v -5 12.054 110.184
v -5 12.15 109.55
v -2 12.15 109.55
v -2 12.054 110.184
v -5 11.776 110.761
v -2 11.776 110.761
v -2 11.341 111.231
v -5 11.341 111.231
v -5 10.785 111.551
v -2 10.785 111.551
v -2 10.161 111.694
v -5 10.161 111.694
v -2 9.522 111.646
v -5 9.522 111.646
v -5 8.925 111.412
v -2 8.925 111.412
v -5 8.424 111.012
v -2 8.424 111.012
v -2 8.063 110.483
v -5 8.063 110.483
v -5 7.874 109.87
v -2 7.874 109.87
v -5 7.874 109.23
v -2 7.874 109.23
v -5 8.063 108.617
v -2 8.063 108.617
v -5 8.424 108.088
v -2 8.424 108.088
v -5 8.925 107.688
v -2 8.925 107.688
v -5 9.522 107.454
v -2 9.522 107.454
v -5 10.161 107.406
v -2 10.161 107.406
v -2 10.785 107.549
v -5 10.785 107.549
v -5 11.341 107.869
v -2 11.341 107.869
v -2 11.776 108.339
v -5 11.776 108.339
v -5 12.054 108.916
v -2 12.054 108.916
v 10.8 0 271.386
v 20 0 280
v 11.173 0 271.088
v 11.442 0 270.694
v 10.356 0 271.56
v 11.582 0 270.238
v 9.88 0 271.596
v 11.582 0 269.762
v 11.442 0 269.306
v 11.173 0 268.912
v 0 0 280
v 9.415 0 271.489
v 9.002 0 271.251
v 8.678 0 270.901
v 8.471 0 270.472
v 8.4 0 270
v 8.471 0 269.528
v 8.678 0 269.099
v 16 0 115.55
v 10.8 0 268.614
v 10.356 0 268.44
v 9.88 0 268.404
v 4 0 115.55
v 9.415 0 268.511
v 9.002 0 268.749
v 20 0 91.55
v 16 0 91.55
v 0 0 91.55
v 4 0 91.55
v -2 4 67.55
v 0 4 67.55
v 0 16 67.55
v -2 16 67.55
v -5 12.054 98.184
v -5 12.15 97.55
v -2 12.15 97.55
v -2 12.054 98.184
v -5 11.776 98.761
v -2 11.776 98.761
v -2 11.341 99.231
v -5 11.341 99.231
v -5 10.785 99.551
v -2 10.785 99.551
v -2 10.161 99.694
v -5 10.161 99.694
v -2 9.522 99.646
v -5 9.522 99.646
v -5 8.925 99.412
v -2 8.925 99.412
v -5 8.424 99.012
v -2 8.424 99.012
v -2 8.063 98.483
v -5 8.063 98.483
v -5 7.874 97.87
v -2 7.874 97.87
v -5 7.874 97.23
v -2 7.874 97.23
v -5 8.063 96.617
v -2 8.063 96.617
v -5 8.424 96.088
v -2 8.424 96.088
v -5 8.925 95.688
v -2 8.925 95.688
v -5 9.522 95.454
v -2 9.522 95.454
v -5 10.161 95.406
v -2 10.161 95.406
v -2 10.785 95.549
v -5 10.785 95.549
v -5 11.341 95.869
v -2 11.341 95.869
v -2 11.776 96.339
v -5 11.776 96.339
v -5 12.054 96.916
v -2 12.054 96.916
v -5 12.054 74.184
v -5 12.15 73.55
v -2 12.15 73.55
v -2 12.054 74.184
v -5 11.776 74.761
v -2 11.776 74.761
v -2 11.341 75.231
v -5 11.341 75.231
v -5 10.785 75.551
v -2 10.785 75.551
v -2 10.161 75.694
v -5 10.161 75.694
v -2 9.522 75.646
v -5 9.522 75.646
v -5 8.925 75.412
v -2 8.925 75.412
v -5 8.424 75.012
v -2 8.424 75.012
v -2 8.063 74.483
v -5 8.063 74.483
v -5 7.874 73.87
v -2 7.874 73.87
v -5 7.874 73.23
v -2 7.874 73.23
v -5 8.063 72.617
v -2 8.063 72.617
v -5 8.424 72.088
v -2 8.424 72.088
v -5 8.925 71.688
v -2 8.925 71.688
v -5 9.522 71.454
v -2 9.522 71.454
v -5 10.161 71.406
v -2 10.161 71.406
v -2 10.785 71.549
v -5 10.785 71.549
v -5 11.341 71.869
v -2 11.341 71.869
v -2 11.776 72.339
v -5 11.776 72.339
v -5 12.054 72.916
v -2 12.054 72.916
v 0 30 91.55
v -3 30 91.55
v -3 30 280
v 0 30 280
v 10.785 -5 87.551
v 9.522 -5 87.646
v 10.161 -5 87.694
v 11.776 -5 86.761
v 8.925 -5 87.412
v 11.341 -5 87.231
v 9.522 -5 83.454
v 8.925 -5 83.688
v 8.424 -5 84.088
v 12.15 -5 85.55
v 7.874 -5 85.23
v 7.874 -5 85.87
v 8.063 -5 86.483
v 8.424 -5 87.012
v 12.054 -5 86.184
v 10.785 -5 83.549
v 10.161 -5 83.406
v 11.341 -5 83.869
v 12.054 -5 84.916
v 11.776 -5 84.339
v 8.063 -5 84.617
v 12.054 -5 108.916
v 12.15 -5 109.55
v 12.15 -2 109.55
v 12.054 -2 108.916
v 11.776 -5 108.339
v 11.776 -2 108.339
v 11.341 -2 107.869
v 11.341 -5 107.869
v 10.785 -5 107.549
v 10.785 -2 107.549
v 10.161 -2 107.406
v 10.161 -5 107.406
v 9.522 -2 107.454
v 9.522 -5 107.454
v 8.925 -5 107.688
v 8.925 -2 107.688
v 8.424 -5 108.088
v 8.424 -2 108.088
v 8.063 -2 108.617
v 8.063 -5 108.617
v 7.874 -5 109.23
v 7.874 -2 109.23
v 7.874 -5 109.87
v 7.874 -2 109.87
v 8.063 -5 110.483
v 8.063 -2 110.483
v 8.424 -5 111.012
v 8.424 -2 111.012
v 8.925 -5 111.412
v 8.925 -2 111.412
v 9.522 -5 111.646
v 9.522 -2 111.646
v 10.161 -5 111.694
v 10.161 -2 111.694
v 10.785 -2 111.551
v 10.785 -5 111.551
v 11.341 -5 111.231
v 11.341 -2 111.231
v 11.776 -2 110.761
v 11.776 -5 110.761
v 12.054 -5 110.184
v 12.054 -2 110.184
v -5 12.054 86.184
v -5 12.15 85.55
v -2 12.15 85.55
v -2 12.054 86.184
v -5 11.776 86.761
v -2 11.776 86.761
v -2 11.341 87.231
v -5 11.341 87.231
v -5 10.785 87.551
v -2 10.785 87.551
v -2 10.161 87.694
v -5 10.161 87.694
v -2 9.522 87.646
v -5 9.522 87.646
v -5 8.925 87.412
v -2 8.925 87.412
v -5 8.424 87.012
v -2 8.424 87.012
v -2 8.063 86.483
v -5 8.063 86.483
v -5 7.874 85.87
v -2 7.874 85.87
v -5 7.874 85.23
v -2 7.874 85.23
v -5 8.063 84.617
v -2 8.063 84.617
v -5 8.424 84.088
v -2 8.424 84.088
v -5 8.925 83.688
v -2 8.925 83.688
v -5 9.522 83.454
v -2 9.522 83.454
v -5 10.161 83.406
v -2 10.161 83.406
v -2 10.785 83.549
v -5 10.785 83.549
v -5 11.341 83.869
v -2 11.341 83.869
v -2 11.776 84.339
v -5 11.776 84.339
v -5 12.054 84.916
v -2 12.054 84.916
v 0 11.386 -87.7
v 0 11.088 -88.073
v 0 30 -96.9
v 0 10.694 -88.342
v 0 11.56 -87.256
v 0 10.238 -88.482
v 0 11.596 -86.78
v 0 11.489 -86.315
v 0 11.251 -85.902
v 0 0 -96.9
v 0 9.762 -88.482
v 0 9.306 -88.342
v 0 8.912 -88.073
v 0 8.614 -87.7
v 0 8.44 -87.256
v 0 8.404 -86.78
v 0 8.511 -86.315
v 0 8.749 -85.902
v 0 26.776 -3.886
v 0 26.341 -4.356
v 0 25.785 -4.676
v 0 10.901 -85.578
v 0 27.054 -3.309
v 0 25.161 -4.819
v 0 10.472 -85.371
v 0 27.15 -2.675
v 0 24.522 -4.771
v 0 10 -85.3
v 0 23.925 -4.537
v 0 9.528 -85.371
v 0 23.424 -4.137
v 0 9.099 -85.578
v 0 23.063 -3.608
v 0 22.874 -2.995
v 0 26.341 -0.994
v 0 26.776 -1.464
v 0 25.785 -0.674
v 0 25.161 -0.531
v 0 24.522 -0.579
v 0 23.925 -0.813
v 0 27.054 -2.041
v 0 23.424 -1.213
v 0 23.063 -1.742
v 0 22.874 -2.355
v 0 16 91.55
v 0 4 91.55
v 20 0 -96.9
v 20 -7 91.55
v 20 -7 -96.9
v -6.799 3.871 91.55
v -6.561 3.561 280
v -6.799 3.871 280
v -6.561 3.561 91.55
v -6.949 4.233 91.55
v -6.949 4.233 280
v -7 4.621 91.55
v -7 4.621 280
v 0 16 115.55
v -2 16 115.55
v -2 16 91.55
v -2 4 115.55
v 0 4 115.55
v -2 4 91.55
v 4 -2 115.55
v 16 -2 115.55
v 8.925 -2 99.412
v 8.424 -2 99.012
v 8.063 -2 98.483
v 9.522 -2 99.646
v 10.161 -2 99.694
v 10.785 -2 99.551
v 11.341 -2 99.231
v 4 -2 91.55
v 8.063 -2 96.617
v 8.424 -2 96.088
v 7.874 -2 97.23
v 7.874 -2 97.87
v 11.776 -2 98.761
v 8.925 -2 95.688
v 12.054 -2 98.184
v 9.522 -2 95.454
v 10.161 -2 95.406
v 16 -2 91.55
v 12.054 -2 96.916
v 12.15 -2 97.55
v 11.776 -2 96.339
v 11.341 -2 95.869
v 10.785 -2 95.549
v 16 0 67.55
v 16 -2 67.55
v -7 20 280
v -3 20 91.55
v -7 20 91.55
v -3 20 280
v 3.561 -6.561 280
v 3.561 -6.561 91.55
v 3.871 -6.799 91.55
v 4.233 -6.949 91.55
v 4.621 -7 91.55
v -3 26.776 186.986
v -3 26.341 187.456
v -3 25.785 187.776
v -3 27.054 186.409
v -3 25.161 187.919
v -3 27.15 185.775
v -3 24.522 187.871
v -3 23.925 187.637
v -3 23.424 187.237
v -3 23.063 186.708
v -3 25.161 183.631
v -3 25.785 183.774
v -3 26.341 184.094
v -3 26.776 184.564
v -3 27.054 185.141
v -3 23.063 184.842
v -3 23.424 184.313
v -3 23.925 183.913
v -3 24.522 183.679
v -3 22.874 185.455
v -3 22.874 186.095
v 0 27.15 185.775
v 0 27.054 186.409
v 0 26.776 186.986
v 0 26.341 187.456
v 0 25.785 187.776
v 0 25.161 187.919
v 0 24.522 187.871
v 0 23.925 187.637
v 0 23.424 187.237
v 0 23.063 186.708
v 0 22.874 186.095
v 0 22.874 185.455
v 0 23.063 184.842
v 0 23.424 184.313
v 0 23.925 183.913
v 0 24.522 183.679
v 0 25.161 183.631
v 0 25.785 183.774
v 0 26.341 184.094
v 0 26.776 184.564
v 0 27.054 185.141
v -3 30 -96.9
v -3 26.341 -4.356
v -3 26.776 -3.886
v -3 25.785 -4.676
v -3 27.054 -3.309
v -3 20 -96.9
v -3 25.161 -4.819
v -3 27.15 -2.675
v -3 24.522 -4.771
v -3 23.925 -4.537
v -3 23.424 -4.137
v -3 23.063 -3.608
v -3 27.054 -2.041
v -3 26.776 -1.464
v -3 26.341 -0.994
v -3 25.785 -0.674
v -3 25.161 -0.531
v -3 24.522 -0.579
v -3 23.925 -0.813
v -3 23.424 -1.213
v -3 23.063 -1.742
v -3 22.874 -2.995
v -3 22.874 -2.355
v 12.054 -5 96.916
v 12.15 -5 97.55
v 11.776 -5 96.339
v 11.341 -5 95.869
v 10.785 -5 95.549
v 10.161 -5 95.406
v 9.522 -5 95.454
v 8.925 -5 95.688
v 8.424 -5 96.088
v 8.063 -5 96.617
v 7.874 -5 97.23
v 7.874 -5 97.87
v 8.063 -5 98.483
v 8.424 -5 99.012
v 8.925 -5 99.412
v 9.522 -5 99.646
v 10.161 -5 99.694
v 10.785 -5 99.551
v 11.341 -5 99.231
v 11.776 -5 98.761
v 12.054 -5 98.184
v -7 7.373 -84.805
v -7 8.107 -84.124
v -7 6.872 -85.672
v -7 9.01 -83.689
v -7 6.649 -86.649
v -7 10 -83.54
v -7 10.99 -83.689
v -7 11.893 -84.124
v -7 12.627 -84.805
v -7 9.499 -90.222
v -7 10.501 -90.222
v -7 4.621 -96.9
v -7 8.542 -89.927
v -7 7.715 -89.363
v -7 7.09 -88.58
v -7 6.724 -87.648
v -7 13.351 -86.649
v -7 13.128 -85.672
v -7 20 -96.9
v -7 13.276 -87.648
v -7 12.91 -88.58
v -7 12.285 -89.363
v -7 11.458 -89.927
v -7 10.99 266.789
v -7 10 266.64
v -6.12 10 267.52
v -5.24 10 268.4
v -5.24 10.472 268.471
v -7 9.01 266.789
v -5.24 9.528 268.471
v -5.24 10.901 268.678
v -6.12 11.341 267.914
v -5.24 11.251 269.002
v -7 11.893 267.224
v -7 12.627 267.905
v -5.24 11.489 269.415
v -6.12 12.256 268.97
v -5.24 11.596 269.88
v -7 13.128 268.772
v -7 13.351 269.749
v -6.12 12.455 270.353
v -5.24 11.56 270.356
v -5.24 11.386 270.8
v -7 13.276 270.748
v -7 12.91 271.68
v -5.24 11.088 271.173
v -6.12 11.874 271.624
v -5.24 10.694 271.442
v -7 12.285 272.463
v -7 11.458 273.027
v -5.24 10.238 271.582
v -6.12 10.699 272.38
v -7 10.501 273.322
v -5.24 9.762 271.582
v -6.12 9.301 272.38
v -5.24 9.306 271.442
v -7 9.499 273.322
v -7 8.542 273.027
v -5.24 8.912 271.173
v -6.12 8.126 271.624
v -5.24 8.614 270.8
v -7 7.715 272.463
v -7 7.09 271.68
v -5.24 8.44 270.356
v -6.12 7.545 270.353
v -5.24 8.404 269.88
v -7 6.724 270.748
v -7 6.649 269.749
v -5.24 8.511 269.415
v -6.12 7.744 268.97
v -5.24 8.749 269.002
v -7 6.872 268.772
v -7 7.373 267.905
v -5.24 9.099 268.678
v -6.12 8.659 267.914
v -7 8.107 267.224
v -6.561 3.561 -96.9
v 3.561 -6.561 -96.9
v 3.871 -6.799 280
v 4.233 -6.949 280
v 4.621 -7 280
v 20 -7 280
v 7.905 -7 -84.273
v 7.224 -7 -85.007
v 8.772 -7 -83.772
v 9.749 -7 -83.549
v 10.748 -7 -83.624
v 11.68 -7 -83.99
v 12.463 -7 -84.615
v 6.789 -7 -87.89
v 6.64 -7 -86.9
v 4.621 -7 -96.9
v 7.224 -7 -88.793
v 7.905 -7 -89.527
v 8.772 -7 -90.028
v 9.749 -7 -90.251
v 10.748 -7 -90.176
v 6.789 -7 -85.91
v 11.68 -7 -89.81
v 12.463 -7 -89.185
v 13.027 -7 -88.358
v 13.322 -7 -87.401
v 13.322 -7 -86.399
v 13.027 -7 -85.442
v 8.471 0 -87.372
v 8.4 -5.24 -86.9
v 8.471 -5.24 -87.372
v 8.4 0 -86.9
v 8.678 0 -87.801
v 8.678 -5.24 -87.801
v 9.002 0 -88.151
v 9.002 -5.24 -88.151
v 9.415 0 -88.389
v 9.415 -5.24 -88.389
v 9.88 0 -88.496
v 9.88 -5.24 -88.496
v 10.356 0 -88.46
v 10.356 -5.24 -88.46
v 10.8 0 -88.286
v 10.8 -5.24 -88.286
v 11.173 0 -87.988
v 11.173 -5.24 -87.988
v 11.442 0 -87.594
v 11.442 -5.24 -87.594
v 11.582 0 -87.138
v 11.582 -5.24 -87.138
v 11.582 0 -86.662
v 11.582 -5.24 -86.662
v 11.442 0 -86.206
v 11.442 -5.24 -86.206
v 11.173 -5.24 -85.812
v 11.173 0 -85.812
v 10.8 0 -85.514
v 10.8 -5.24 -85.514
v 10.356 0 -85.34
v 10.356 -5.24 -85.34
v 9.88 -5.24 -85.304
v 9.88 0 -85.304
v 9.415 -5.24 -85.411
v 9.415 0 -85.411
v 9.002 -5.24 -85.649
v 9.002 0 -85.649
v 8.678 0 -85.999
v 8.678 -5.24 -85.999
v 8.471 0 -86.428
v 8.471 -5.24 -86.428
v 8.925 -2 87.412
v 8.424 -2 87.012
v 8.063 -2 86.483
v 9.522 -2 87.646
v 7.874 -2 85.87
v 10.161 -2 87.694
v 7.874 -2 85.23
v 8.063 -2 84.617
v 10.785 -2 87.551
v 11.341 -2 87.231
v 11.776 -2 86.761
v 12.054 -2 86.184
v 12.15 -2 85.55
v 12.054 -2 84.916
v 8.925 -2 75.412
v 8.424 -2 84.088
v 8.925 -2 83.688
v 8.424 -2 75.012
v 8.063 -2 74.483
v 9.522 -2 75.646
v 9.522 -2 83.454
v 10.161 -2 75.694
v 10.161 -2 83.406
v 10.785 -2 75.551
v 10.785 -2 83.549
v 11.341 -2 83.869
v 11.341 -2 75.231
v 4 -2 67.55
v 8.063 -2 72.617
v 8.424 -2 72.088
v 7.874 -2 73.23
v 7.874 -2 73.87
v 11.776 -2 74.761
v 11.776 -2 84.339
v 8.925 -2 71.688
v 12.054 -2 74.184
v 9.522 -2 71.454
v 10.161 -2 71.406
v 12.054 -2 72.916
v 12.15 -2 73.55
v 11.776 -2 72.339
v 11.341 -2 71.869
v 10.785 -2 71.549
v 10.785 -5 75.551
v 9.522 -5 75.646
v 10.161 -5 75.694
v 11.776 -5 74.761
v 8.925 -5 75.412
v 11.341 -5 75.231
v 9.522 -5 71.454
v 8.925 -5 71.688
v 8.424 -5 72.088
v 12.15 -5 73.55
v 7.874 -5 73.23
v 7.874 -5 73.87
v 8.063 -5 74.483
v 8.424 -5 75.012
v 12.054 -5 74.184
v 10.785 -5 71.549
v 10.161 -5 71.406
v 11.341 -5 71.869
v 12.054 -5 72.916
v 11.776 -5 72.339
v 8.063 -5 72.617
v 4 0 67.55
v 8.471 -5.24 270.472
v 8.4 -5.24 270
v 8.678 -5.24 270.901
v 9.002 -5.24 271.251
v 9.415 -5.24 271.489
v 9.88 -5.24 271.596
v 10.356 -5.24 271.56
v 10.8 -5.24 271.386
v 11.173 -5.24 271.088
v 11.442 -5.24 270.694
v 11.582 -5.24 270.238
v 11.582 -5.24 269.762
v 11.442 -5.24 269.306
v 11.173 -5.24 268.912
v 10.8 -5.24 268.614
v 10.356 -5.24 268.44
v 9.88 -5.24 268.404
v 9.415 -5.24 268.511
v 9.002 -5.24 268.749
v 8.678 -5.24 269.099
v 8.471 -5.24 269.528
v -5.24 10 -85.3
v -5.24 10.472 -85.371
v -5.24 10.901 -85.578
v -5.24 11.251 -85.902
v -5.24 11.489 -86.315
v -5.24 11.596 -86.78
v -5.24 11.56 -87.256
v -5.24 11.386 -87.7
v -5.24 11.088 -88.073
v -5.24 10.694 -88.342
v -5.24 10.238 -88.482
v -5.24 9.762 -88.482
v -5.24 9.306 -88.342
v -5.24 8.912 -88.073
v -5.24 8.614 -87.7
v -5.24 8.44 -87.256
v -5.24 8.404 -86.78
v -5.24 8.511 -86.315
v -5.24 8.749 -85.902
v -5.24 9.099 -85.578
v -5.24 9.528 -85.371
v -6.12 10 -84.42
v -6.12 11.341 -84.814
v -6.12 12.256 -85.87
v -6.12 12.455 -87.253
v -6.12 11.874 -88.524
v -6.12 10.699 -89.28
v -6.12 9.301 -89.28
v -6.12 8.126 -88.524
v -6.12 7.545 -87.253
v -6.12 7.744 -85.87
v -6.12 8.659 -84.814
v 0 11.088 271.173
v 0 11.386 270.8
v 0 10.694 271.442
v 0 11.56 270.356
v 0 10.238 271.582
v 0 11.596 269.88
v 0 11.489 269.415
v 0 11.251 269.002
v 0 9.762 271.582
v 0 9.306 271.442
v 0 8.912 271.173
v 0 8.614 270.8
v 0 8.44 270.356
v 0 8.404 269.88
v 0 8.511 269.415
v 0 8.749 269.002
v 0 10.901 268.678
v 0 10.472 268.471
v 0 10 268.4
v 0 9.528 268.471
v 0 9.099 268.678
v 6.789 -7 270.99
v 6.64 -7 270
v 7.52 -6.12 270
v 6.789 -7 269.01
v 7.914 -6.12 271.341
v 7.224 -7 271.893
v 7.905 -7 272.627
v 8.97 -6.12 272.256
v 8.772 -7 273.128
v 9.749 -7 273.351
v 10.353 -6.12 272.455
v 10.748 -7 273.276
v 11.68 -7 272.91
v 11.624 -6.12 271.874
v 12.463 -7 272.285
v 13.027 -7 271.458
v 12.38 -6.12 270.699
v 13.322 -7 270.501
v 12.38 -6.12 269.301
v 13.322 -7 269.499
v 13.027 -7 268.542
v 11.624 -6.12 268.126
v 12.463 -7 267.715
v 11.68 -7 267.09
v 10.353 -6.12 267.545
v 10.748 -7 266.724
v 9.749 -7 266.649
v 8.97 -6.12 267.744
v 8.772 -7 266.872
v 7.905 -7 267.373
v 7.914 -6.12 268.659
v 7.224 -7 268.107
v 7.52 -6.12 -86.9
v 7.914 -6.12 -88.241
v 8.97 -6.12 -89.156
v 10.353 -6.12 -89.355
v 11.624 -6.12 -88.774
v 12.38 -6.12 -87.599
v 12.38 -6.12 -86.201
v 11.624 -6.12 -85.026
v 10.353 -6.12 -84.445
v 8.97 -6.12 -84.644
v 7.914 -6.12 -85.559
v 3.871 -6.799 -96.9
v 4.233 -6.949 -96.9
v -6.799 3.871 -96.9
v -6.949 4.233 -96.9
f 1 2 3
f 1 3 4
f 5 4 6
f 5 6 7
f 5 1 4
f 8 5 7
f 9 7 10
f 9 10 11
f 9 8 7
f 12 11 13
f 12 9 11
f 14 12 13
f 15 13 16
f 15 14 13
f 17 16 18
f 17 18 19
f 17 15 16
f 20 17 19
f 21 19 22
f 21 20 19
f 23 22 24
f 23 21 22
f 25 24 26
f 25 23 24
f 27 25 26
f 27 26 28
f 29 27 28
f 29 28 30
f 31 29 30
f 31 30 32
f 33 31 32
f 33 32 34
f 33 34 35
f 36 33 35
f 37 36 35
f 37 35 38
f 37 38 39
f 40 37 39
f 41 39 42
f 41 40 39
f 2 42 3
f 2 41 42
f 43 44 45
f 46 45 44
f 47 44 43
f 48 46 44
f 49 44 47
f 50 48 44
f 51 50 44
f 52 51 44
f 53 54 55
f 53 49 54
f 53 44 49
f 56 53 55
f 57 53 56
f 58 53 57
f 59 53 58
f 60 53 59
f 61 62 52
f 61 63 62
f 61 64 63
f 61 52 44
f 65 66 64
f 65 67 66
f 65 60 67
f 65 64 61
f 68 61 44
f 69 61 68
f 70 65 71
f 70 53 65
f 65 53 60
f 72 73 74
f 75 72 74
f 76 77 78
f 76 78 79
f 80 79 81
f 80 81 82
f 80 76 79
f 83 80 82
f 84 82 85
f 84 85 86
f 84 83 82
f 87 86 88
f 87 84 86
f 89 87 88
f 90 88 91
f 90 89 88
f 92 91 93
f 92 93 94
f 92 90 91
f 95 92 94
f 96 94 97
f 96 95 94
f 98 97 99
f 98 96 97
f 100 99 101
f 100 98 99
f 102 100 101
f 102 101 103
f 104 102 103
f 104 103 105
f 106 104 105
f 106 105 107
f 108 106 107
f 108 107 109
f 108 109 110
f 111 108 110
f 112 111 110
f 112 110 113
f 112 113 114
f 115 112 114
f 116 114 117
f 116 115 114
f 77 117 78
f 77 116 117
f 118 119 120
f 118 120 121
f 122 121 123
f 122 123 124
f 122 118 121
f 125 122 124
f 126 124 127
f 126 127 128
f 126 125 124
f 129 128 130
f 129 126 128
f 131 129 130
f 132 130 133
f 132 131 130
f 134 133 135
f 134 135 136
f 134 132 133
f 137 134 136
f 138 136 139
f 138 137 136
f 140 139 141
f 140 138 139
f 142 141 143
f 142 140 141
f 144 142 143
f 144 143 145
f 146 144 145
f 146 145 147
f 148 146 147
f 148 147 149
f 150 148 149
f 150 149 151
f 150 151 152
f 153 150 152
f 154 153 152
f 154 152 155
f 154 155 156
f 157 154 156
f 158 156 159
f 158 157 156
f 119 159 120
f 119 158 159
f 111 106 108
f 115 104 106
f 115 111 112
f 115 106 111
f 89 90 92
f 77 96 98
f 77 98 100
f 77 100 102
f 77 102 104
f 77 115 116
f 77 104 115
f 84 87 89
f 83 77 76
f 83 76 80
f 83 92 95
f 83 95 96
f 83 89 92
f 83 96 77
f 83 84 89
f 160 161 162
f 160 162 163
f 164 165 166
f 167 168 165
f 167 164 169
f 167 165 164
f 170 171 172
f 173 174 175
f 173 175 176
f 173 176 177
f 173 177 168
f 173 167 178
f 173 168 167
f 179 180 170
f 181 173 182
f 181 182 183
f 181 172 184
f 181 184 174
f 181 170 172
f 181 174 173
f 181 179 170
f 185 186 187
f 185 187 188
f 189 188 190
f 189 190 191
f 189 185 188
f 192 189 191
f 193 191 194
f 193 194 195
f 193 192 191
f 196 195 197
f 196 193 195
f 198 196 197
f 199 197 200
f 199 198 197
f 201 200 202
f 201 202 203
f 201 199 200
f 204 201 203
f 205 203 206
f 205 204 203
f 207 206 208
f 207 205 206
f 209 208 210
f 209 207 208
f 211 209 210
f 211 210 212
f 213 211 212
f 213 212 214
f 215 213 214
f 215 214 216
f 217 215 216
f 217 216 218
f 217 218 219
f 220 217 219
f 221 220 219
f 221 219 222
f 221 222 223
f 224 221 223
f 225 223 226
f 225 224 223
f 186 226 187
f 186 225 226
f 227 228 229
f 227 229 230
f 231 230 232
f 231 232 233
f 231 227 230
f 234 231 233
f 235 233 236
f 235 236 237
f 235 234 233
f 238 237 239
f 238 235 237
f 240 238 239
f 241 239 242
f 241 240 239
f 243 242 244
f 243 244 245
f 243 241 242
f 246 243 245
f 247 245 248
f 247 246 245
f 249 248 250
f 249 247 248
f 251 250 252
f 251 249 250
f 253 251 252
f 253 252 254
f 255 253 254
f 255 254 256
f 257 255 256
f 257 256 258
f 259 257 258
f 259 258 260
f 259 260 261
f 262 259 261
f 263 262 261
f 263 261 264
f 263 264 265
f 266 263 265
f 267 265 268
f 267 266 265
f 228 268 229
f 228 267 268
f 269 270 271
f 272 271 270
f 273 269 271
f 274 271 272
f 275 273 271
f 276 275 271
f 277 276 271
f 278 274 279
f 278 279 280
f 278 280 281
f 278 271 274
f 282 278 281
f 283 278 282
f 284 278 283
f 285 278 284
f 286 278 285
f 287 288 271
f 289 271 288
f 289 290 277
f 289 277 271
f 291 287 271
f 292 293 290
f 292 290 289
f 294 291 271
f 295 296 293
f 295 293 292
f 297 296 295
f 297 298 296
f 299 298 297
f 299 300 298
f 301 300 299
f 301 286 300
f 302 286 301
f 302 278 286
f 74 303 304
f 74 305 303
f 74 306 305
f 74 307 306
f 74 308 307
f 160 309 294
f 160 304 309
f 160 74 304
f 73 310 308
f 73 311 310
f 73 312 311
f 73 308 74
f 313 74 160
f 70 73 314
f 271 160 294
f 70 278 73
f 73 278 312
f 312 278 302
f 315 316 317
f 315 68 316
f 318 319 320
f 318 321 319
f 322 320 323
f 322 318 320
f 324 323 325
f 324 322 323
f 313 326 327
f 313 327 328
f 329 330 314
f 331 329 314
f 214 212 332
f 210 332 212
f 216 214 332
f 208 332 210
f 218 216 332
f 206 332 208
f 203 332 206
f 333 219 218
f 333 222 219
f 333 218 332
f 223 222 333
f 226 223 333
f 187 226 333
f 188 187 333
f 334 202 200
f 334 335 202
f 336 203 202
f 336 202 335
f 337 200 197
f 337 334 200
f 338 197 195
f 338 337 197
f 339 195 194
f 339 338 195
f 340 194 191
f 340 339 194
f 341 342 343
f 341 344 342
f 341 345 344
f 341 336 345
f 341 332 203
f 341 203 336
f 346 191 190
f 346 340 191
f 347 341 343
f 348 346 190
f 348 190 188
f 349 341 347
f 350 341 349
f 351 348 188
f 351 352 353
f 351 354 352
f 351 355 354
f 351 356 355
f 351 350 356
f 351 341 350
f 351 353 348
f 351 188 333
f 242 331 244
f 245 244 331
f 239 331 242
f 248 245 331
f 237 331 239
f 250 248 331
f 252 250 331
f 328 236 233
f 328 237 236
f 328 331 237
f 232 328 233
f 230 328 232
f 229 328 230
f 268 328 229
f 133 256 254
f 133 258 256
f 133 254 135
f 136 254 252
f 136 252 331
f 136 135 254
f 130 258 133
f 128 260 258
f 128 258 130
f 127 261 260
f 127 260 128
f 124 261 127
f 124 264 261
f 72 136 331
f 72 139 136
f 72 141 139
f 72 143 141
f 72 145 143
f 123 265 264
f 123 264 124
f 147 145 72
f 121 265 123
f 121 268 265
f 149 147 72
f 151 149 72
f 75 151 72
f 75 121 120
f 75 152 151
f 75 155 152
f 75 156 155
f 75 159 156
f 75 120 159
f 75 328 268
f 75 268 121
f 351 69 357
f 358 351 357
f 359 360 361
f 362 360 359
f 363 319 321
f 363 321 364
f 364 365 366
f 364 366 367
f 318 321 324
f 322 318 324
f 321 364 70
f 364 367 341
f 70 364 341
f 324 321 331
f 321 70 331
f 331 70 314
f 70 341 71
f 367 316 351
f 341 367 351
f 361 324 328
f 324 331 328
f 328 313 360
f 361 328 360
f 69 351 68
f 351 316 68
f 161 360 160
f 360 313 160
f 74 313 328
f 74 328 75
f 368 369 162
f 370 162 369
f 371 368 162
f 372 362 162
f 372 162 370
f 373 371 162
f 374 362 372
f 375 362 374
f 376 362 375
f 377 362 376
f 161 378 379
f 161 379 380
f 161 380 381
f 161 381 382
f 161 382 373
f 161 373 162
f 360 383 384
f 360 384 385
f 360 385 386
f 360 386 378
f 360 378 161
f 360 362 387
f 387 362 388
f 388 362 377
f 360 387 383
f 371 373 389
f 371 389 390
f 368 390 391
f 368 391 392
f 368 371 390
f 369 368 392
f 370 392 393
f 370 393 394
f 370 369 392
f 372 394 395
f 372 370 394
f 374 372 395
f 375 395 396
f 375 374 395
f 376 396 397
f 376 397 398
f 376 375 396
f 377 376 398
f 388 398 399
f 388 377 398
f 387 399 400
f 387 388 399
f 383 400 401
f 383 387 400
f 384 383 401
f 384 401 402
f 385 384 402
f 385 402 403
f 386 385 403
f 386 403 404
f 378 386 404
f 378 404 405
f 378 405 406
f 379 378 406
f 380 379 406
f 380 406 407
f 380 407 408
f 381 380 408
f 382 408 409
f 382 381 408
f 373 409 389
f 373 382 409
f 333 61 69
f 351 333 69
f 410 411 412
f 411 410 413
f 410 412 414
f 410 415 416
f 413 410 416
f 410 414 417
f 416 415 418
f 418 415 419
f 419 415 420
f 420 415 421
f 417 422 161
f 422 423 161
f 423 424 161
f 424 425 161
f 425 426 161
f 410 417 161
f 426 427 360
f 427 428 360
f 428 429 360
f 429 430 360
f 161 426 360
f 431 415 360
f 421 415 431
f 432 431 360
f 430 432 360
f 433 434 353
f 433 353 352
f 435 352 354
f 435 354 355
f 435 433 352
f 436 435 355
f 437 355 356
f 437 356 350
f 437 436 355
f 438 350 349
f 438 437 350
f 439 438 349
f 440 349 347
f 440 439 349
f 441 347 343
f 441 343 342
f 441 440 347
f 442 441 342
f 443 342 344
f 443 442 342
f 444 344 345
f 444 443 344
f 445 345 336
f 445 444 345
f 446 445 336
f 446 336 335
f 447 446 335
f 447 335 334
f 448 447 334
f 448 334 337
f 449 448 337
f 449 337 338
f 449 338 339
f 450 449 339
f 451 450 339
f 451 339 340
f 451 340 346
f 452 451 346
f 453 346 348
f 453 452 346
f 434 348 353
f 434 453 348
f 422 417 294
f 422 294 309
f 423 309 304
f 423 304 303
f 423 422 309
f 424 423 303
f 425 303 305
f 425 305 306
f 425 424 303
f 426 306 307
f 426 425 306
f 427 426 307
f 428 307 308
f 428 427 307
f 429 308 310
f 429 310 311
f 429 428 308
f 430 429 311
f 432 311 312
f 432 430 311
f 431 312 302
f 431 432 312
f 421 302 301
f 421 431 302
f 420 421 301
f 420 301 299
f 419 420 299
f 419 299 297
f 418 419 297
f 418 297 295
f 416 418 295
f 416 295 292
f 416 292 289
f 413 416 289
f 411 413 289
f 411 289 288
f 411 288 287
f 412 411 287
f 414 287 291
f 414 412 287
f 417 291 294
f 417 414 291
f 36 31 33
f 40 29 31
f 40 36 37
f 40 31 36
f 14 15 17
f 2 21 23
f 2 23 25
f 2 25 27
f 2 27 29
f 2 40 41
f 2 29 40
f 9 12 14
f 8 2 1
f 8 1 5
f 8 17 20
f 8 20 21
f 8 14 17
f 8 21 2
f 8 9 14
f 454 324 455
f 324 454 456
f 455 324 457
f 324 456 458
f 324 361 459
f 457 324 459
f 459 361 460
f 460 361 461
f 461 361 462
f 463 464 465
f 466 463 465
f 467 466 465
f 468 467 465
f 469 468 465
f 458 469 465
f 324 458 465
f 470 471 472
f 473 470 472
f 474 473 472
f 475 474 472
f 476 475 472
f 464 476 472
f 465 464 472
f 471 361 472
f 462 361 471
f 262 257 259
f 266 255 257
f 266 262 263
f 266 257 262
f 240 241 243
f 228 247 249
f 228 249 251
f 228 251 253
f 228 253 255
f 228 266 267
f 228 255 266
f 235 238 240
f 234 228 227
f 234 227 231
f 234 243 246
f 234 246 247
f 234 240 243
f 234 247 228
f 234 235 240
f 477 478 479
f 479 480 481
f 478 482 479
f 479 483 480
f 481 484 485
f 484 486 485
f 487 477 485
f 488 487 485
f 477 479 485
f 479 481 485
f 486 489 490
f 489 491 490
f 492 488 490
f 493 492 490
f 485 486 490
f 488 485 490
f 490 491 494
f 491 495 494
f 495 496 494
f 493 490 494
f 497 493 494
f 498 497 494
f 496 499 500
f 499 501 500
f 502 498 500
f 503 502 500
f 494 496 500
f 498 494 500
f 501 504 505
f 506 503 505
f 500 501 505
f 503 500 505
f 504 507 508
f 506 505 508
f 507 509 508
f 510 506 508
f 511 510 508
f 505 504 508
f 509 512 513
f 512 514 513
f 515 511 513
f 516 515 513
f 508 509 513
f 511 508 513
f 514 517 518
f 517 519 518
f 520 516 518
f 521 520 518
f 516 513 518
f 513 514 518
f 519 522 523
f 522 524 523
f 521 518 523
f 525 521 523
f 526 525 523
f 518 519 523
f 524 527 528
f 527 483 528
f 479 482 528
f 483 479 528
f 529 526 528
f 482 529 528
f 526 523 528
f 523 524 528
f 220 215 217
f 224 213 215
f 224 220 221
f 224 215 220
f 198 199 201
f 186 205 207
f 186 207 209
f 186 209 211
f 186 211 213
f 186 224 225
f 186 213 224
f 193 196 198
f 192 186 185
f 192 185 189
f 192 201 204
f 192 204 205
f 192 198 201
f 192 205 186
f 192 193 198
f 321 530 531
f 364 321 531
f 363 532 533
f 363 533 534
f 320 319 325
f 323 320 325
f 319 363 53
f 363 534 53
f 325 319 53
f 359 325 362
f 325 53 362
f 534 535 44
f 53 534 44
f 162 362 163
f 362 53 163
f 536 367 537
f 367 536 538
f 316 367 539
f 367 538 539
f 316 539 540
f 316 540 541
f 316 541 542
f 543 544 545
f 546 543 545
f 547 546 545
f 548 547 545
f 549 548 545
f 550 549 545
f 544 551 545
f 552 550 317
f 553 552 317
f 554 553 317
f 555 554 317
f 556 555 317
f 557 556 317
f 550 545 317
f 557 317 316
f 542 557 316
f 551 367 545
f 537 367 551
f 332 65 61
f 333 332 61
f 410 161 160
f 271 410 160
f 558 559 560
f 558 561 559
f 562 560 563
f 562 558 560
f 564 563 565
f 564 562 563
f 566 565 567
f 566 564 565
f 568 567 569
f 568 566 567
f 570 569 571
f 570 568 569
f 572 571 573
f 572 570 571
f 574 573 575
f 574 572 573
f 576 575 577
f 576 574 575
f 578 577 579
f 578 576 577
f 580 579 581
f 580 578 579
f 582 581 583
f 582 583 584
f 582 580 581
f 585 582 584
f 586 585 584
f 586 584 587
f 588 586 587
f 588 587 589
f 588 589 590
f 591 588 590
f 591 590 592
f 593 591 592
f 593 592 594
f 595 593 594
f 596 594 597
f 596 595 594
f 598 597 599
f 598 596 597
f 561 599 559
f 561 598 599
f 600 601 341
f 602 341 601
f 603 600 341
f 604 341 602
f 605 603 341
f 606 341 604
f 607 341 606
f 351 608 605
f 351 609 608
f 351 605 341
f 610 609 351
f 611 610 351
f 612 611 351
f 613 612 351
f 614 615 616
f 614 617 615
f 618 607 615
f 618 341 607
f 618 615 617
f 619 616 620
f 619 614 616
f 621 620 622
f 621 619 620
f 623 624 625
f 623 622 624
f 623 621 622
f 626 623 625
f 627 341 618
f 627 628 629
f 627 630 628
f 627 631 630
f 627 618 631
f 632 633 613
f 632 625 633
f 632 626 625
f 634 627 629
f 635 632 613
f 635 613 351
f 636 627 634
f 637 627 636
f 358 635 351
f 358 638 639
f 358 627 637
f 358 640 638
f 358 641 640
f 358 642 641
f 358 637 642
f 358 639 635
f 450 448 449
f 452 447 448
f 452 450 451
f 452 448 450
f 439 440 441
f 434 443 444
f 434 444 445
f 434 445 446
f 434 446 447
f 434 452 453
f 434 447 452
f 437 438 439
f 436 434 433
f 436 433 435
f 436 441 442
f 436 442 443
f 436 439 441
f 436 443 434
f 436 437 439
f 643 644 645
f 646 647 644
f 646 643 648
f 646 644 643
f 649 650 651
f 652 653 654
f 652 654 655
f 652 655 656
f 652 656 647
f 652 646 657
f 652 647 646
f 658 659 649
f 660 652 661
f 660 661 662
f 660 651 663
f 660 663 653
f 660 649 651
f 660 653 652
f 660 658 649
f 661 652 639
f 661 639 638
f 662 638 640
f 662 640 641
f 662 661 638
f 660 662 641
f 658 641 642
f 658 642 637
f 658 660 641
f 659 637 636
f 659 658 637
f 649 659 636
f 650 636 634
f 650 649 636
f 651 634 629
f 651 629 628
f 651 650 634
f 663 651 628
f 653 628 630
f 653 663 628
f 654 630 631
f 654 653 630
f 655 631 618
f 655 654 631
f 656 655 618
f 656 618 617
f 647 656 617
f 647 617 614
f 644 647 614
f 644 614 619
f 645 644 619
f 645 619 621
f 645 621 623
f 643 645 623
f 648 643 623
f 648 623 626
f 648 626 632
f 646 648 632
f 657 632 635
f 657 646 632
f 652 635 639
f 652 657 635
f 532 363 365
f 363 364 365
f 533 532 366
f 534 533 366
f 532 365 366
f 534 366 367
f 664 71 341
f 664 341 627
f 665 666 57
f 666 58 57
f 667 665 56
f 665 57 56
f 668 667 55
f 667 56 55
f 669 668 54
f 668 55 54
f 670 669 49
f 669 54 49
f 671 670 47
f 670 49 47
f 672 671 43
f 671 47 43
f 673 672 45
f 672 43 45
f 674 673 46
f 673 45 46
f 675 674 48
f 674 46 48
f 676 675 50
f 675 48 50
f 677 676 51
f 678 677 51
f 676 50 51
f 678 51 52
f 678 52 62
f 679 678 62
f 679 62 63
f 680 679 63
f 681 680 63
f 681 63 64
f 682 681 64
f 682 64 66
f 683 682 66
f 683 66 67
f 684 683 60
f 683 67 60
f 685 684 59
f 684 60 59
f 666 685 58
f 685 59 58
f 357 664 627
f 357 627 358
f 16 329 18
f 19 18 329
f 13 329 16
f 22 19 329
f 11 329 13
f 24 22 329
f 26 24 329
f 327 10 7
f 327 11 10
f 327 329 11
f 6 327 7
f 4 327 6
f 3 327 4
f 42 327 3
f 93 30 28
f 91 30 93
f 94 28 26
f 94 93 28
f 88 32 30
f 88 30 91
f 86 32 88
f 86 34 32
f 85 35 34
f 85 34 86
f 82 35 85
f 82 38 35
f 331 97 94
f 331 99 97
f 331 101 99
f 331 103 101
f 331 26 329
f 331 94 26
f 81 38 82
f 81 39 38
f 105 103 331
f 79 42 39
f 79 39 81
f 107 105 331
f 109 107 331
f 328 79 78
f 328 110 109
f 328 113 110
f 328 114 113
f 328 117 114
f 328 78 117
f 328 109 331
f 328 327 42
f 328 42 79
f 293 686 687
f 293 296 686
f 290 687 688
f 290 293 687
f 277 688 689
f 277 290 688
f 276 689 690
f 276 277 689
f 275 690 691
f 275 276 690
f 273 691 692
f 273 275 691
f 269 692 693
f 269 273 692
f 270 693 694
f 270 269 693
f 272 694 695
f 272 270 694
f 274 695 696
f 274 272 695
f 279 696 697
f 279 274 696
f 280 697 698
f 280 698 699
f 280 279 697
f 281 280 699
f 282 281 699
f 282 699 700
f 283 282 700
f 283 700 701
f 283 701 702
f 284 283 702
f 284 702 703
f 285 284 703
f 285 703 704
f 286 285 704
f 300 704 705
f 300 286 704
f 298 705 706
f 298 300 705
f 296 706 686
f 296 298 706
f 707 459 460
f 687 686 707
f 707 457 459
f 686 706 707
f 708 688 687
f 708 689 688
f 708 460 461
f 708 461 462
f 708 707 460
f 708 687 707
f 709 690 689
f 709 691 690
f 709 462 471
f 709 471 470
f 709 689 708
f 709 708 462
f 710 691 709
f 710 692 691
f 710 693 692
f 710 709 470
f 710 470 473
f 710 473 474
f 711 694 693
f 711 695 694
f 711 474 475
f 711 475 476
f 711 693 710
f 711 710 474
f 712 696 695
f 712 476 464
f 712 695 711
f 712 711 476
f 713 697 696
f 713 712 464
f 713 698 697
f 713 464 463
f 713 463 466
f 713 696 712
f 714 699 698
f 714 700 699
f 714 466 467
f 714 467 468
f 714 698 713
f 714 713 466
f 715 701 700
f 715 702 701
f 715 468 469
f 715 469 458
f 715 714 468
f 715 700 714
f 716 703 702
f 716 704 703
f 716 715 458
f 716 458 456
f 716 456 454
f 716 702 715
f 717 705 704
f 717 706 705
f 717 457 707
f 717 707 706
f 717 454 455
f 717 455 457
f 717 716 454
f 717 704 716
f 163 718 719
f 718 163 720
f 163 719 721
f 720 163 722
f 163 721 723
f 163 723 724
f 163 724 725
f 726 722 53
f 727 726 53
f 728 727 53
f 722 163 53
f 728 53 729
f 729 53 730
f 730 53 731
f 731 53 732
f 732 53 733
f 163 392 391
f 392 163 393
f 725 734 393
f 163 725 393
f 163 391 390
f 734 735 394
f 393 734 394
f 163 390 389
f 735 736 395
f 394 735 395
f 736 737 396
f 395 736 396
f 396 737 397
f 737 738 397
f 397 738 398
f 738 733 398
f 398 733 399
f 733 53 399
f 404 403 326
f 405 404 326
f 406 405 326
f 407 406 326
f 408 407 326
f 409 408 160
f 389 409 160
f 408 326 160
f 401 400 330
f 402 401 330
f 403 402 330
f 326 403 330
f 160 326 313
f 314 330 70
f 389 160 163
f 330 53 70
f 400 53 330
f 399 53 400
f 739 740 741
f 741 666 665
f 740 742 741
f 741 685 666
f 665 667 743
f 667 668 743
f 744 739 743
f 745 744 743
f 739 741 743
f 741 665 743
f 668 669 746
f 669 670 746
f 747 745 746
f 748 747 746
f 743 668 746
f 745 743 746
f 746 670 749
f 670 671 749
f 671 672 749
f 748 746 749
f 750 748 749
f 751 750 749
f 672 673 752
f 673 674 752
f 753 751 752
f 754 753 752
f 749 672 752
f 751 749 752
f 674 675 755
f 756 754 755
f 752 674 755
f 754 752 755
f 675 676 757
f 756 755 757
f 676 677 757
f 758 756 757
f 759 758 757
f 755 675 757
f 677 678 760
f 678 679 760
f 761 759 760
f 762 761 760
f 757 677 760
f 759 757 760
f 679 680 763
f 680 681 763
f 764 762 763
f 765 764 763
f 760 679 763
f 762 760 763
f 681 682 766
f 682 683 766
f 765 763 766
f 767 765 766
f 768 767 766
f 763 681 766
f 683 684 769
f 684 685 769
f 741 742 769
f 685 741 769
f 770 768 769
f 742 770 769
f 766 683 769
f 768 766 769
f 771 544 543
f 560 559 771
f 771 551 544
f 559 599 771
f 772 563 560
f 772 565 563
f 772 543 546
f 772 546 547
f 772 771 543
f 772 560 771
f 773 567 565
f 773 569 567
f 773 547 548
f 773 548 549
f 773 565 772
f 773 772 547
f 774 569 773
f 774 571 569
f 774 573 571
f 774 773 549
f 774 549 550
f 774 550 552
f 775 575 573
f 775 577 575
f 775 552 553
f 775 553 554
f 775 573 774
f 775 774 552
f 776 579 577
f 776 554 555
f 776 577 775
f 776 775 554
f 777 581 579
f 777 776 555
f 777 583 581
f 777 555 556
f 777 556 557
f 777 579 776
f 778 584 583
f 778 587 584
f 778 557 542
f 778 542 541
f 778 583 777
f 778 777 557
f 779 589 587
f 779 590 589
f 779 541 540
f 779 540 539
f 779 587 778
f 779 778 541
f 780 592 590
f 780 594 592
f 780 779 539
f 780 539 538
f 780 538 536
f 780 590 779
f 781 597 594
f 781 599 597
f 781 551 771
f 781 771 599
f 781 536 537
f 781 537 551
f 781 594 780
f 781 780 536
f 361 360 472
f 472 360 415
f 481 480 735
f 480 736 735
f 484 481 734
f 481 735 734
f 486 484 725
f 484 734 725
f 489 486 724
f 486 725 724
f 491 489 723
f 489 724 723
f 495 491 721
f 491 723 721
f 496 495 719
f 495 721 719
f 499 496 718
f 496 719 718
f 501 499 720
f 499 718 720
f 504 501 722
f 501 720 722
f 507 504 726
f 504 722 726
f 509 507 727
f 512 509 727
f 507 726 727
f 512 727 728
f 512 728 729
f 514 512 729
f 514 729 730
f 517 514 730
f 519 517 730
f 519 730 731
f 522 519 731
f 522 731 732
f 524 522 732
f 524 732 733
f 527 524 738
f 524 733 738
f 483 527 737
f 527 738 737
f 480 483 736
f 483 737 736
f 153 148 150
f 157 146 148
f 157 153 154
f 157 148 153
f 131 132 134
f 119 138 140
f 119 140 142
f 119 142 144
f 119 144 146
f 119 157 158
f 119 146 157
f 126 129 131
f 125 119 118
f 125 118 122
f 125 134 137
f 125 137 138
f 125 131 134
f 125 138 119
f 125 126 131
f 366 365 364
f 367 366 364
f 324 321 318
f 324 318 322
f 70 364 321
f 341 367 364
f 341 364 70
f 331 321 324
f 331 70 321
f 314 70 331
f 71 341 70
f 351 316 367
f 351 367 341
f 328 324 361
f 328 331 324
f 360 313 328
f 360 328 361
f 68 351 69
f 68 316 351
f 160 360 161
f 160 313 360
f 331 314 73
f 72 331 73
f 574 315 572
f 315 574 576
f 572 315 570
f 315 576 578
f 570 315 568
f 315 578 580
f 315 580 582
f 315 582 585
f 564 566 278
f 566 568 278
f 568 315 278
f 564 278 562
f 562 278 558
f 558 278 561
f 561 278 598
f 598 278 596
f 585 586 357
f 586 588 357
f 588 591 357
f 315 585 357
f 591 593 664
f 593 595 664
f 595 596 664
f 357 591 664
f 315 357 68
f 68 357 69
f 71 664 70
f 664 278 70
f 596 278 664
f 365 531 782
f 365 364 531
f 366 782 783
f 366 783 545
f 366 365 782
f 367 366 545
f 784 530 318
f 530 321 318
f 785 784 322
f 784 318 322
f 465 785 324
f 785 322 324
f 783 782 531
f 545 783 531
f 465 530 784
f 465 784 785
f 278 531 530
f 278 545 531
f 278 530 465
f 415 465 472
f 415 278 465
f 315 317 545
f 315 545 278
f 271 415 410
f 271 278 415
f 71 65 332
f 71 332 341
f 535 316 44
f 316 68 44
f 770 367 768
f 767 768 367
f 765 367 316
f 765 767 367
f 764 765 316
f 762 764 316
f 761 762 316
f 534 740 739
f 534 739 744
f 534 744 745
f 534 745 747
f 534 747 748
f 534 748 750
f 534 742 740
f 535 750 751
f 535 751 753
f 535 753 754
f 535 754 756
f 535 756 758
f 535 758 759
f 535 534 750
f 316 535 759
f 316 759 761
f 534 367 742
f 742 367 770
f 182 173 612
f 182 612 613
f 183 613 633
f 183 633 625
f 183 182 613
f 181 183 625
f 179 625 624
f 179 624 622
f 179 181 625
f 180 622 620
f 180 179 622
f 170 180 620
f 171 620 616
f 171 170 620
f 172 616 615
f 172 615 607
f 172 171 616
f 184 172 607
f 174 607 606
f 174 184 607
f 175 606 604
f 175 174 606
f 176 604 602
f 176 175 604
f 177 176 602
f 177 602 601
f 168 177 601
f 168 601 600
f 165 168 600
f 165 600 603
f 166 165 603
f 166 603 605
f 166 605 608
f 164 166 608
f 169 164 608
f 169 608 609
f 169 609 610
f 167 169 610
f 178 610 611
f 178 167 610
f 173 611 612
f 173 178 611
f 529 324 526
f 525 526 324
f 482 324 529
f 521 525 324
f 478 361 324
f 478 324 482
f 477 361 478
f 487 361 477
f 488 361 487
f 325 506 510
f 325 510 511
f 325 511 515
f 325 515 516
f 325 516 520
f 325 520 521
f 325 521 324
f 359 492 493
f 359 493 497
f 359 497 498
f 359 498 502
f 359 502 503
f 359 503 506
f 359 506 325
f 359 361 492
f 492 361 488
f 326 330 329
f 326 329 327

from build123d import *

# Parameters (mm, degrees)
BOSS_EXTRUDE1_DEPTH                = 188.45
FILLET1_R                          = 1.5
SKETCH6_W                          = 188.45
SKETCH6_H                          = 3
BOSS_EXTRUDE2_DEPTH                = 10
SKETCH7_W                          = 13
SKETCH7_H                          = 188.45
BOSS_EXTRUDE3_DEPTH                = 4
SKETCH8_W                          = 3
SKETCH8_H                          = 188.45
BOSS_EXTRUDE4_DEPTH                = 10
SKETCH9_W                          = 188.45
SKETCH9_H                          = 13
BOSS_EXTRUDE5_DEPTH                = 4
CSK_FOR_M3_SFHCS1_D                = 3.2
CSK_FOR_M3_SFHCS1_CSINK_D          = 6.72
CSK_FOR_M3_SFHCS1_CSINK_ANGLE      = 90
CSK_FOR_M3_SFHCS2_D                = 3.2
CSK_FOR_M3_SFHCS2_CSINK_D          = 6.72
CSK_FOR_M3_SFHCS2_CSINK_ANGLE      = 90
SKETCH14_W                         = 10
SKETCH14_H                         = 188.45
CUT_EXTRUDE1_DEPTH                 = 10
F_4_3_START                        = -3
F_4_3_4_3_DIAMETER_HOLE3_OUTLINE_R = 2.15
F_4_3_4_3_DIAMETER_HOLE3_DEPTH     = 3
SKETCH17_W                         = 12
SKETCH17_H                         = 48
CUT_EXTRUDE2_DEPTH                 = 2
SKETCH18_W                         = 48
SKETCH18_H                         = 12
CUT_EXTRUDE3_DEPTH                 = 2
F_4_3_START_2                      = -5
F_4_3_4_3_DIAMETER_HOLE1_OUTLINE_R = 2.15
F_4_3_4_3_DIAMETER_HOLE1_DEPTH     = 3
F_4_3_4_3_DIAMETER_HOLE2_OUTLINE_R = 2.15
F_4_3_4_3_DIAMETER_HOLE2_DEPTH     = 3


# Read off the part's stored shape, not the designer's step: Ø4.3 (4.3) Diameter Hole3, Ø4.3 (4.3) Diameter Hole1, Ø4.3 (4.3) Diameter Hole2
with BuildPart() as part:
    # Sketch1 → Boss-Extrude1 (new body)
    with BuildSketch(Plane.XY.offset(280)):
        Polygon((-7, 4), (4, -7), (7, -7), (7, -3), (20, -3), (20, 0), (0, 0), (0, 20), (-3, 20), (-3, 7), (-7, 7), align=None)
    extrude(amount=-BOSS_EXTRUDE1_DEPTH)

    # Fillet1
    fillet1_edges = [part.edges().sort_by_distance(p)[0] for p in [
        (4, -7, 185.775),
        (-7, 4, 185.775),
    ]]
    fillet(fillet1_edges, radius=FILLET1_R)

    # Sketch6 → Boss-Extrude2 (add)
    with BuildSketch(Plane(origin=(20, 0, 0), x_dir=(0, 0, -1), z_dir=(1, 0, 0))):
        with Locations((-185.775, -1.5)):
            Rectangle(SKETCH6_W, SKETCH6_H)
    extrude(amount=BOSS_EXTRUDE2_DEPTH)

    # Sketch7 → Boss-Extrude3 (add)
    with BuildSketch(Plane.XZ.offset(3)):
        with Locations((13.5, 185.775)):
            Rectangle(SKETCH7_W, SKETCH7_H)
    extrude(amount=BOSS_EXTRUDE3_DEPTH)

    # Sketch8 → Boss-Extrude4 (add)
    with BuildSketch(Plane(origin=(0, 20, 0), x_dir=(1, 0, 0), z_dir=(0, 1, 0))):
        with Locations((-1.5, -185.775)):
            Rectangle(SKETCH8_W, SKETCH8_H)
    extrude(amount=BOSS_EXTRUDE4_DEPTH)

    # Sketch9 → Boss-Extrude5 (add)
    with BuildSketch(Plane.ZY.offset(3)):
        with Locations((185.775, 13.5)):
            Rectangle(SKETCH9_W, SKETCH9_H)
    extrude(amount=BOSS_EXTRUDE5_DEPTH)

    # CSK for M3 SFHCS1 (through all)
    with Locations(Plane.XZ.offset(7)):
        with Locations((10, 270)):
            CounterSinkHole(CSK_FOR_M3_SFHCS1_D / 2, CSK_FOR_M3_SFHCS1_CSINK_D / 2, counter_sink_angle=CSK_FOR_M3_SFHCS1_CSINK_ANGLE)

    # CSK for M3 SFHCS2 (through all)
    with Locations(Plane.ZY.offset(7)):
        with Locations((270, 10)):
            CounterSinkHole(CSK_FOR_M3_SFHCS2_D / 2, CSK_FOR_M3_SFHCS2_CSINK_D / 2, counter_sink_angle=CSK_FOR_M3_SFHCS2_CSINK_ANGLE)

    # Sketch14 → Cut-Extrude1 (cut)
    with BuildSketch(Plane.XZ.offset(3)):
        with Locations((25, 185.775)):
            Rectangle(SKETCH14_W, SKETCH14_H)
    extrude(amount=-CUT_EXTRUDE1_DEPTH, mode=Mode.SUBTRACT)


with BuildPart() as body_2:
    # Mirror1: mirrored copy
    add(part.part.mirror(Plane.XY.offset(91.55)))


with BuildPart() as f_4_3_4_3_diameter_hole3_tool:
    # Ø4.3 (4.3) Diameter Hole3 outline → Ø4.3 (4.3) Diameter Hole3 (new body)
    with BuildSketch(Plane.YZ.offset(F_4_3_START)):
        with Locations((25, -2.675)):
            Circle(F_4_3_4_3_DIAMETER_HOLE3_OUTLINE_R)
        with Locations((25, 185.775)):
            Circle(F_4_3_4_3_DIAMETER_HOLE3_OUTLINE_R)
    extrude(amount=F_4_3_4_3_DIAMETER_HOLE3_DEPTH)


with BuildPart() as part_1:
    add(part.part)

    # Ø4.3 (4.3) Diameter Hole3: cut by f_4_3_4_3_diameter_hole3_tool
    add(f_4_3_4_3_diameter_hole3_tool.part, mode=Mode.SUBTRACT)


with BuildPart() as body_2_1:
    add(body_2.part)

    # Ø4.3 (4.3) Diameter Hole3: cut by f_4_3_4_3_diameter_hole3_tool
    add(f_4_3_4_3_diameter_hole3_tool.part, mode=Mode.SUBTRACT)


with BuildPart() as cut_extrude2_tool:
    # Sketch17 → Cut-Extrude2 (new body)
    with BuildSketch(Plane(origin=(0, 0, 0), x_dir=(1, 0, 0), z_dir=(0, 1, 0))):
        with Locations((10, -91.55)):
            Rectangle(SKETCH17_W, SKETCH17_H)
    extrude(amount=-CUT_EXTRUDE2_DEPTH)


with BuildPart() as part_2:
    add(part_1.part)

    # Cut-Extrude2: cut by cut_extrude2_tool
    add(cut_extrude2_tool.part, mode=Mode.SUBTRACT)


with BuildPart() as body_2_2:
    add(body_2_1.part)

    # Cut-Extrude2: cut by cut_extrude2_tool
    add(cut_extrude2_tool.part, mode=Mode.SUBTRACT)


with BuildPart() as cut_extrude3_tool:
    # Sketch18 → Cut-Extrude3 (new body)
    with BuildSketch(Plane(origin=(0, 0, 0), x_dir=(0, 0, -1), z_dir=(1, 0, 0))):
        with Locations((-91.55, 10)):
            Rectangle(SKETCH18_W, SKETCH18_H)
    extrude(amount=-CUT_EXTRUDE3_DEPTH)


with BuildPart() as part_3:
    add(part_2.part)

    # Cut-Extrude3: cut by cut_extrude3_tool
    add(cut_extrude3_tool.part, mode=Mode.SUBTRACT)


with BuildPart() as body_2_3:
    add(body_2_2.part)

    # Cut-Extrude3: cut by cut_extrude3_tool
    add(cut_extrude3_tool.part, mode=Mode.SUBTRACT)


with BuildPart() as f_4_3_4_3_diameter_hole1_tool:
    # Ø4.3 (4.3) Diameter Hole1 outline → Ø4.3 (4.3) Diameter Hole1 (new body)
    with BuildSketch(Plane(origin=(0, 0, 0), x_dir=(1, 0, 0), z_dir=(0, 1, 0)).offset(F_4_3_START_2)):
        with Locations((10, -73.55)):
            Circle(F_4_3_4_3_DIAMETER_HOLE1_OUTLINE_R)
        with Locations((10, -85.55)):
            Circle(F_4_3_4_3_DIAMETER_HOLE1_OUTLINE_R)
        with Locations((10, -109.55)):
            Circle(F_4_3_4_3_DIAMETER_HOLE1_OUTLINE_R)
        with Locations((10, -97.55)):
            Circle(F_4_3_4_3_DIAMETER_HOLE1_OUTLINE_R)
    extrude(amount=F_4_3_4_3_DIAMETER_HOLE1_DEPTH)


with BuildPart() as part_4:
    add(part_3.part)

    # Ø4.3 (4.3) Diameter Hole1: cut by f_4_3_4_3_diameter_hole1_tool
    add(f_4_3_4_3_diameter_hole1_tool.part, mode=Mode.SUBTRACT)


with BuildPart() as body_2_4:
    add(body_2_3.part)

    # Ø4.3 (4.3) Diameter Hole1: cut by f_4_3_4_3_diameter_hole1_tool
    add(f_4_3_4_3_diameter_hole1_tool.part, mode=Mode.SUBTRACT)


with BuildPart() as f_4_3_4_3_diameter_hole2_tool:
    # Ø4.3 (4.3) Diameter Hole2 outline → Ø4.3 (4.3) Diameter Hole2 (new body)
    with BuildSketch(Plane.YZ.offset(F_4_3_START_2)):
        with Locations((10, 73.55)):
            Circle(F_4_3_4_3_DIAMETER_HOLE2_OUTLINE_R)
        with Locations((10, 85.55)):
            Circle(F_4_3_4_3_DIAMETER_HOLE2_OUTLINE_R)
        with Locations((10, 97.55)):
            Circle(F_4_3_4_3_DIAMETER_HOLE2_OUTLINE_R)
        with Locations((10, 109.55)):
            Circle(F_4_3_4_3_DIAMETER_HOLE2_OUTLINE_R)
    extrude(amount=F_4_3_4_3_DIAMETER_HOLE2_DEPTH)


with BuildPart() as part_5:
    add(part_4.part)

    # Ø4.3 (4.3) Diameter Hole2: cut by f_4_3_4_3_diameter_hole2_tool
    add(f_4_3_4_3_diameter_hole2_tool.part, mode=Mode.SUBTRACT)


with BuildPart() as body_2_5:
    add(body_2_4.part)

    # Ø4.3 (4.3) Diameter Hole2: cut by f_4_3_4_3_diameter_hole2_tool
    add(f_4_3_4_3_diameter_hole2_tool.part, mode=Mode.SUBTRACT)


solid = Compound([part_5.part, body_2_5.part])
